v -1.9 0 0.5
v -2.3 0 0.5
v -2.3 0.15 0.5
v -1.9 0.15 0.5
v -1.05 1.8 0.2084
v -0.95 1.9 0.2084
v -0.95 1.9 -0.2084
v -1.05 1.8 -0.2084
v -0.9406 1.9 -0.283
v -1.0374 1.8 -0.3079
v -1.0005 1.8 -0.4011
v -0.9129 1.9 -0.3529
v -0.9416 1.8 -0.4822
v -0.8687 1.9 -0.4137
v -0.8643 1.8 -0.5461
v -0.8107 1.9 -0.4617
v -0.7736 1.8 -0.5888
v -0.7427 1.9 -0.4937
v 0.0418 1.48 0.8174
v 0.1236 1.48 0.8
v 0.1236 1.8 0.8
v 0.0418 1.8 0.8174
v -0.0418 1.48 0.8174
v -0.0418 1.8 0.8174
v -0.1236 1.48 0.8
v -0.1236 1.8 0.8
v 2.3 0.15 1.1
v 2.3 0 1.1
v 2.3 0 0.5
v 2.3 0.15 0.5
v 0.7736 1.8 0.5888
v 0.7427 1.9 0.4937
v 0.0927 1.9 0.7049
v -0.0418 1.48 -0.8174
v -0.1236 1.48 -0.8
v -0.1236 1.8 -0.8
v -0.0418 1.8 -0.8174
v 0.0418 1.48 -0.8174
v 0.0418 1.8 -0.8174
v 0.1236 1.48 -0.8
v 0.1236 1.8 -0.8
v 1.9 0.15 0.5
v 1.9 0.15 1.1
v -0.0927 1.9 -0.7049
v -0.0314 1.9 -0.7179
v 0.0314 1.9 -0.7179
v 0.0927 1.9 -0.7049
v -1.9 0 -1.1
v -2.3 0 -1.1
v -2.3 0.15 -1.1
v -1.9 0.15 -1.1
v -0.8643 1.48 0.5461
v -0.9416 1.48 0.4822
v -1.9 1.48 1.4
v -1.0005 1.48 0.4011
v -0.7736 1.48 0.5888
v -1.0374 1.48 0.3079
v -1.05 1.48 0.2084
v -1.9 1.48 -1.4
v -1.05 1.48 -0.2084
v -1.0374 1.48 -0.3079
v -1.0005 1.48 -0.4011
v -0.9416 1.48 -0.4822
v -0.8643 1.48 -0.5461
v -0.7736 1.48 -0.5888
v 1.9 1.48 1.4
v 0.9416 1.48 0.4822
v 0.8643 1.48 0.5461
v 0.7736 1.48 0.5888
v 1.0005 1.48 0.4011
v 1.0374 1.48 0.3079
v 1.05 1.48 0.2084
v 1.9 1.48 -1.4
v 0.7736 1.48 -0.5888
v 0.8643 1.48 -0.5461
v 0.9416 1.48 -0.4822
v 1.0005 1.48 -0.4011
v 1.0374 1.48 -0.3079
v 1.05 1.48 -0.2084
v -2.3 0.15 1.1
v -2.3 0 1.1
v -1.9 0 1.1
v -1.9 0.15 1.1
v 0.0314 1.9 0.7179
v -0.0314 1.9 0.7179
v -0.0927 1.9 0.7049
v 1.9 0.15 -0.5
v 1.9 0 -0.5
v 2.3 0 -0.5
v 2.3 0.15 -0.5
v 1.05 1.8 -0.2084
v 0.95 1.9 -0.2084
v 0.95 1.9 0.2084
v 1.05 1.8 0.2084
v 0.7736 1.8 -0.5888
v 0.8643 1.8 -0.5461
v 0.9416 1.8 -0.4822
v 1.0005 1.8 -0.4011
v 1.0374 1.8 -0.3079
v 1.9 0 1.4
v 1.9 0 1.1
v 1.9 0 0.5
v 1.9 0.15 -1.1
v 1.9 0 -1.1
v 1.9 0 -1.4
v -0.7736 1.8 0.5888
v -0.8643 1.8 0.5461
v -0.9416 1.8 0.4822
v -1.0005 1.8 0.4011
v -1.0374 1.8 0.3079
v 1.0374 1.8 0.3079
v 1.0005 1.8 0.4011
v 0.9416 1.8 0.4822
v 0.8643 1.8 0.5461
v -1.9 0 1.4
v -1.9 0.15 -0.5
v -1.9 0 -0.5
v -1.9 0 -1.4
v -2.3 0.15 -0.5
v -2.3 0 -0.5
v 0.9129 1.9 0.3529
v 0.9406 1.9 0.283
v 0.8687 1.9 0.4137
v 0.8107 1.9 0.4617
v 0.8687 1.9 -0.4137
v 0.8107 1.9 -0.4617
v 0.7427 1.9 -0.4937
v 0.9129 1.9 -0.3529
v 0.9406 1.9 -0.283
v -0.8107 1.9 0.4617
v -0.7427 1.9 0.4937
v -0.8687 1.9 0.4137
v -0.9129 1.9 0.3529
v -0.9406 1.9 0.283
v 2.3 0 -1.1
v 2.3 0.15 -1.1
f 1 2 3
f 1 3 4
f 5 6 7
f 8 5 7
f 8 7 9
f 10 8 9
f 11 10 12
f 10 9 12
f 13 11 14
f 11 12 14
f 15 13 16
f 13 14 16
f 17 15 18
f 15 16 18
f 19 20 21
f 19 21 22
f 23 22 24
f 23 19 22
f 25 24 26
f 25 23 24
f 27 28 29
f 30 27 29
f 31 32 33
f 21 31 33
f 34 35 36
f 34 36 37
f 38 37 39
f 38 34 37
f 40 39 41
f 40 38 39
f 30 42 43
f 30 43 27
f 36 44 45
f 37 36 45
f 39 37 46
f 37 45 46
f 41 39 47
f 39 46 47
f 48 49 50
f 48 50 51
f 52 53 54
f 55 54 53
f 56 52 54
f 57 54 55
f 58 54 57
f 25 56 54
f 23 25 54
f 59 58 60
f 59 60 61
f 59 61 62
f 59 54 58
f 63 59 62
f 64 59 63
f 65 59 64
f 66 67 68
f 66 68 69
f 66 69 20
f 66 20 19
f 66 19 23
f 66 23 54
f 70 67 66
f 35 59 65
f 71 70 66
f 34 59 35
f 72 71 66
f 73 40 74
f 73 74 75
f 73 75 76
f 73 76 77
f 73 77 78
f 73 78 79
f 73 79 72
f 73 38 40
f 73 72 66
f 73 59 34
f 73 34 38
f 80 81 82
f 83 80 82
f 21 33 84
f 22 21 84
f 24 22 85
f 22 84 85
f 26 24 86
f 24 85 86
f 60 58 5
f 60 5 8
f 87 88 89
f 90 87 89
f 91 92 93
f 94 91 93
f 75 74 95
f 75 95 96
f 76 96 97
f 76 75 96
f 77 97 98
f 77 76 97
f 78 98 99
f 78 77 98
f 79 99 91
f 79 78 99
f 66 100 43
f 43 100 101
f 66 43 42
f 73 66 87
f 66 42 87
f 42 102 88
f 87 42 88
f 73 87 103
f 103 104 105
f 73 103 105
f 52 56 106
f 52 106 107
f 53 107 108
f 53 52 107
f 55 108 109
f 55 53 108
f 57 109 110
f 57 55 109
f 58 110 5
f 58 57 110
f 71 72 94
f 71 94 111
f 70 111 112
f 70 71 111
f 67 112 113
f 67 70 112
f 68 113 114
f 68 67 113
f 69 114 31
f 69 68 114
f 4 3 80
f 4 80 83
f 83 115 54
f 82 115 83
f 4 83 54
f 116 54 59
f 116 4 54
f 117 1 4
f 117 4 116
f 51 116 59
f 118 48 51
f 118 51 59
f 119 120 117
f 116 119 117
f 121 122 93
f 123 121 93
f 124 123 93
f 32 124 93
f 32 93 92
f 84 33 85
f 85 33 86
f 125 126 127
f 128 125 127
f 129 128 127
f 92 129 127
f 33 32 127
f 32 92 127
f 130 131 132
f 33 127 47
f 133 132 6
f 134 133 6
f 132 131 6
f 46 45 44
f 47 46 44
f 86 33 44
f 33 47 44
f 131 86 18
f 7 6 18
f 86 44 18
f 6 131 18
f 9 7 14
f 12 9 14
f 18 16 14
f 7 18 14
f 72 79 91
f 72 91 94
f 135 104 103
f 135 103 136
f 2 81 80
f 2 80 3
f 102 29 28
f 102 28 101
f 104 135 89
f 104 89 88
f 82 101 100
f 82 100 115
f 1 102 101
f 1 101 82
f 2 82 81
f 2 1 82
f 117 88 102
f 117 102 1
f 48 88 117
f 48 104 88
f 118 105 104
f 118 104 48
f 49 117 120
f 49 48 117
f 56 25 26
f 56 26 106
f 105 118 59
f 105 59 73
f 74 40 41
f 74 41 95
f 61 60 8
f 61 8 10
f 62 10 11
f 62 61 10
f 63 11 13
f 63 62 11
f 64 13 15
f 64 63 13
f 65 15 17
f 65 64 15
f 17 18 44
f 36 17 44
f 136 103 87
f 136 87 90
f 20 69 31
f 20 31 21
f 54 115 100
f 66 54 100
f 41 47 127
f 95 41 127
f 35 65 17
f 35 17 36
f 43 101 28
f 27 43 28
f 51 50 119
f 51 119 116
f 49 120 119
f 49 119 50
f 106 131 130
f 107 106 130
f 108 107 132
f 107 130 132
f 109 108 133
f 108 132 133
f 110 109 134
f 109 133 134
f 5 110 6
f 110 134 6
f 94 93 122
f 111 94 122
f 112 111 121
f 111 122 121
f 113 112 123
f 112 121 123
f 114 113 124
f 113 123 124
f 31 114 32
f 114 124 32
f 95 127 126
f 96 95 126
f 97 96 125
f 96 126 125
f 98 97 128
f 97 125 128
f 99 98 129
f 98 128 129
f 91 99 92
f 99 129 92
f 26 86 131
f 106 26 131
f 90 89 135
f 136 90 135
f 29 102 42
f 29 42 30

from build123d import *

# Parameters (mm, degrees)
ESQUISSE2_W        = 3.8
ESQUISSE2_H        = 2.8
BOSS_EXTRU_1_DEPTH = 1.48
BOSS_EXTRU_2_DEPTH = 1.9
CHANFREIN1_SIZE    = 0.1
ESQUISSE4_W        = 0.4
ESQUISSE4_H        = 0.6
BOSS_EXTRU_3_DEPTH = 0.15


with BuildPart() as part:
    # Esquisse2 → Boss.-Extru.1 (new body)
    with BuildSketch(Plane(origin=(0, 0, 0), x_dir=(1, 0, 0), z_dir=(0, 1, 0))):
        Rectangle(ESQUISSE2_W, ESQUISSE2_H)
    extrude(amount=BOSS_EXTRU_1_DEPTH)

    # Esquisse3 → Boss.-Extru.2 (add)
    with BuildSketch(Plane(origin=(0, 0, 0), x_dir=(1, 0, 0), z_dir=(0, 1, 0))):
        with BuildLine():
            Line((0.123606798, 0.8), (0.773606798, 0.588802197))
            ThreePointArc((0.773606798, 0.588802197), (0.973606798, 0.443493692), (1.05, 0.208379591))
            Line((1.05, 0.208379591), (1.05, -0.208379591))
            ThreePointArc((1.05, -0.208379591), (0.973606798, -0.443493692), (0.773606798, -0.588802197))
            Line((0.773606798, -0.588802197), (0.123606798, -0.8))
            ThreePointArc((0.123606798, -0.8), (0, -0.819577393), (-0.123606798, -0.8))
            Line((-0.123606798, -0.8), (-0.773606798, -0.588802197))
            ThreePointArc((-0.773606798, -0.588802197), (-0.973606798, -0.443493692), (-1.05, -0.208379591))
            Line((-1.05, -0.208379591), (-1.05, 0.208379591))
            ThreePointArc((-1.05, 0.208379591), (-0.973606798, 0.443493692), (-0.773606798, 0.588802197))
            Line((-0.773606798, 0.588802197), (-0.123606798, 0.8))
            ThreePointArc((-0.123606798, 0.8), (0, 0.819577393), (0.123606798, 0.8))
        make_face()
    extrude(amount=BOSS_EXTRU_2_DEPTH)

    # Chanfrein1
    chanfrein1_edges = [part.edges().sort_by_distance(p)[0] for p in [
        (0, 1.9, -0.819577393),
        (-0.448606798, 1.9, -0.694401099),
        (-0.973606798, 1.9, -0.443493692),
        (-1.05, 1.9, 0),
        (-0.973606798, 1.9, 0.443493692),
        (-0.448606798, 1.9, 0.694401099),
        (0, 1.9, 0.819577393),
        (0.448606798, 1.9, 0.694401099),
        (0.973606798, 1.9, 0.443493692),
        (1.05, 1.9, 0),
        (0.973606798, 1.9, -0.443493692),
        (0.448606798, 1.9, -0.694401099),
    ]]
    chamfer(chanfrein1_edges, length=CHANFREIN1_SIZE)

    # Esquisse4 → Boss.-Extru.3 (add)
    with BuildSketch(Plane(origin=(0, 0, 0), x_dir=(1, 0, 0), z_dir=(0, 1, 0))):
        with Locations((-2.1, 0.8)):
            Rectangle(ESQUISSE4_W, ESQUISSE4_H)
        with Locations((-2.1, -0.8)):
            Rectangle(ESQUISSE4_W, ESQUISSE4_H)
        with Locations((2.1, -0.8)):
            Rectangle(ESQUISSE4_W, ESQUISSE4_H)
        with Locations((2.1, 0.8)):
            Rectangle(ESQUISSE4_W, ESQUISSE4_H)
    extrude(amount=BOSS_EXTRU_3_DEPTH)


solid = part.part
